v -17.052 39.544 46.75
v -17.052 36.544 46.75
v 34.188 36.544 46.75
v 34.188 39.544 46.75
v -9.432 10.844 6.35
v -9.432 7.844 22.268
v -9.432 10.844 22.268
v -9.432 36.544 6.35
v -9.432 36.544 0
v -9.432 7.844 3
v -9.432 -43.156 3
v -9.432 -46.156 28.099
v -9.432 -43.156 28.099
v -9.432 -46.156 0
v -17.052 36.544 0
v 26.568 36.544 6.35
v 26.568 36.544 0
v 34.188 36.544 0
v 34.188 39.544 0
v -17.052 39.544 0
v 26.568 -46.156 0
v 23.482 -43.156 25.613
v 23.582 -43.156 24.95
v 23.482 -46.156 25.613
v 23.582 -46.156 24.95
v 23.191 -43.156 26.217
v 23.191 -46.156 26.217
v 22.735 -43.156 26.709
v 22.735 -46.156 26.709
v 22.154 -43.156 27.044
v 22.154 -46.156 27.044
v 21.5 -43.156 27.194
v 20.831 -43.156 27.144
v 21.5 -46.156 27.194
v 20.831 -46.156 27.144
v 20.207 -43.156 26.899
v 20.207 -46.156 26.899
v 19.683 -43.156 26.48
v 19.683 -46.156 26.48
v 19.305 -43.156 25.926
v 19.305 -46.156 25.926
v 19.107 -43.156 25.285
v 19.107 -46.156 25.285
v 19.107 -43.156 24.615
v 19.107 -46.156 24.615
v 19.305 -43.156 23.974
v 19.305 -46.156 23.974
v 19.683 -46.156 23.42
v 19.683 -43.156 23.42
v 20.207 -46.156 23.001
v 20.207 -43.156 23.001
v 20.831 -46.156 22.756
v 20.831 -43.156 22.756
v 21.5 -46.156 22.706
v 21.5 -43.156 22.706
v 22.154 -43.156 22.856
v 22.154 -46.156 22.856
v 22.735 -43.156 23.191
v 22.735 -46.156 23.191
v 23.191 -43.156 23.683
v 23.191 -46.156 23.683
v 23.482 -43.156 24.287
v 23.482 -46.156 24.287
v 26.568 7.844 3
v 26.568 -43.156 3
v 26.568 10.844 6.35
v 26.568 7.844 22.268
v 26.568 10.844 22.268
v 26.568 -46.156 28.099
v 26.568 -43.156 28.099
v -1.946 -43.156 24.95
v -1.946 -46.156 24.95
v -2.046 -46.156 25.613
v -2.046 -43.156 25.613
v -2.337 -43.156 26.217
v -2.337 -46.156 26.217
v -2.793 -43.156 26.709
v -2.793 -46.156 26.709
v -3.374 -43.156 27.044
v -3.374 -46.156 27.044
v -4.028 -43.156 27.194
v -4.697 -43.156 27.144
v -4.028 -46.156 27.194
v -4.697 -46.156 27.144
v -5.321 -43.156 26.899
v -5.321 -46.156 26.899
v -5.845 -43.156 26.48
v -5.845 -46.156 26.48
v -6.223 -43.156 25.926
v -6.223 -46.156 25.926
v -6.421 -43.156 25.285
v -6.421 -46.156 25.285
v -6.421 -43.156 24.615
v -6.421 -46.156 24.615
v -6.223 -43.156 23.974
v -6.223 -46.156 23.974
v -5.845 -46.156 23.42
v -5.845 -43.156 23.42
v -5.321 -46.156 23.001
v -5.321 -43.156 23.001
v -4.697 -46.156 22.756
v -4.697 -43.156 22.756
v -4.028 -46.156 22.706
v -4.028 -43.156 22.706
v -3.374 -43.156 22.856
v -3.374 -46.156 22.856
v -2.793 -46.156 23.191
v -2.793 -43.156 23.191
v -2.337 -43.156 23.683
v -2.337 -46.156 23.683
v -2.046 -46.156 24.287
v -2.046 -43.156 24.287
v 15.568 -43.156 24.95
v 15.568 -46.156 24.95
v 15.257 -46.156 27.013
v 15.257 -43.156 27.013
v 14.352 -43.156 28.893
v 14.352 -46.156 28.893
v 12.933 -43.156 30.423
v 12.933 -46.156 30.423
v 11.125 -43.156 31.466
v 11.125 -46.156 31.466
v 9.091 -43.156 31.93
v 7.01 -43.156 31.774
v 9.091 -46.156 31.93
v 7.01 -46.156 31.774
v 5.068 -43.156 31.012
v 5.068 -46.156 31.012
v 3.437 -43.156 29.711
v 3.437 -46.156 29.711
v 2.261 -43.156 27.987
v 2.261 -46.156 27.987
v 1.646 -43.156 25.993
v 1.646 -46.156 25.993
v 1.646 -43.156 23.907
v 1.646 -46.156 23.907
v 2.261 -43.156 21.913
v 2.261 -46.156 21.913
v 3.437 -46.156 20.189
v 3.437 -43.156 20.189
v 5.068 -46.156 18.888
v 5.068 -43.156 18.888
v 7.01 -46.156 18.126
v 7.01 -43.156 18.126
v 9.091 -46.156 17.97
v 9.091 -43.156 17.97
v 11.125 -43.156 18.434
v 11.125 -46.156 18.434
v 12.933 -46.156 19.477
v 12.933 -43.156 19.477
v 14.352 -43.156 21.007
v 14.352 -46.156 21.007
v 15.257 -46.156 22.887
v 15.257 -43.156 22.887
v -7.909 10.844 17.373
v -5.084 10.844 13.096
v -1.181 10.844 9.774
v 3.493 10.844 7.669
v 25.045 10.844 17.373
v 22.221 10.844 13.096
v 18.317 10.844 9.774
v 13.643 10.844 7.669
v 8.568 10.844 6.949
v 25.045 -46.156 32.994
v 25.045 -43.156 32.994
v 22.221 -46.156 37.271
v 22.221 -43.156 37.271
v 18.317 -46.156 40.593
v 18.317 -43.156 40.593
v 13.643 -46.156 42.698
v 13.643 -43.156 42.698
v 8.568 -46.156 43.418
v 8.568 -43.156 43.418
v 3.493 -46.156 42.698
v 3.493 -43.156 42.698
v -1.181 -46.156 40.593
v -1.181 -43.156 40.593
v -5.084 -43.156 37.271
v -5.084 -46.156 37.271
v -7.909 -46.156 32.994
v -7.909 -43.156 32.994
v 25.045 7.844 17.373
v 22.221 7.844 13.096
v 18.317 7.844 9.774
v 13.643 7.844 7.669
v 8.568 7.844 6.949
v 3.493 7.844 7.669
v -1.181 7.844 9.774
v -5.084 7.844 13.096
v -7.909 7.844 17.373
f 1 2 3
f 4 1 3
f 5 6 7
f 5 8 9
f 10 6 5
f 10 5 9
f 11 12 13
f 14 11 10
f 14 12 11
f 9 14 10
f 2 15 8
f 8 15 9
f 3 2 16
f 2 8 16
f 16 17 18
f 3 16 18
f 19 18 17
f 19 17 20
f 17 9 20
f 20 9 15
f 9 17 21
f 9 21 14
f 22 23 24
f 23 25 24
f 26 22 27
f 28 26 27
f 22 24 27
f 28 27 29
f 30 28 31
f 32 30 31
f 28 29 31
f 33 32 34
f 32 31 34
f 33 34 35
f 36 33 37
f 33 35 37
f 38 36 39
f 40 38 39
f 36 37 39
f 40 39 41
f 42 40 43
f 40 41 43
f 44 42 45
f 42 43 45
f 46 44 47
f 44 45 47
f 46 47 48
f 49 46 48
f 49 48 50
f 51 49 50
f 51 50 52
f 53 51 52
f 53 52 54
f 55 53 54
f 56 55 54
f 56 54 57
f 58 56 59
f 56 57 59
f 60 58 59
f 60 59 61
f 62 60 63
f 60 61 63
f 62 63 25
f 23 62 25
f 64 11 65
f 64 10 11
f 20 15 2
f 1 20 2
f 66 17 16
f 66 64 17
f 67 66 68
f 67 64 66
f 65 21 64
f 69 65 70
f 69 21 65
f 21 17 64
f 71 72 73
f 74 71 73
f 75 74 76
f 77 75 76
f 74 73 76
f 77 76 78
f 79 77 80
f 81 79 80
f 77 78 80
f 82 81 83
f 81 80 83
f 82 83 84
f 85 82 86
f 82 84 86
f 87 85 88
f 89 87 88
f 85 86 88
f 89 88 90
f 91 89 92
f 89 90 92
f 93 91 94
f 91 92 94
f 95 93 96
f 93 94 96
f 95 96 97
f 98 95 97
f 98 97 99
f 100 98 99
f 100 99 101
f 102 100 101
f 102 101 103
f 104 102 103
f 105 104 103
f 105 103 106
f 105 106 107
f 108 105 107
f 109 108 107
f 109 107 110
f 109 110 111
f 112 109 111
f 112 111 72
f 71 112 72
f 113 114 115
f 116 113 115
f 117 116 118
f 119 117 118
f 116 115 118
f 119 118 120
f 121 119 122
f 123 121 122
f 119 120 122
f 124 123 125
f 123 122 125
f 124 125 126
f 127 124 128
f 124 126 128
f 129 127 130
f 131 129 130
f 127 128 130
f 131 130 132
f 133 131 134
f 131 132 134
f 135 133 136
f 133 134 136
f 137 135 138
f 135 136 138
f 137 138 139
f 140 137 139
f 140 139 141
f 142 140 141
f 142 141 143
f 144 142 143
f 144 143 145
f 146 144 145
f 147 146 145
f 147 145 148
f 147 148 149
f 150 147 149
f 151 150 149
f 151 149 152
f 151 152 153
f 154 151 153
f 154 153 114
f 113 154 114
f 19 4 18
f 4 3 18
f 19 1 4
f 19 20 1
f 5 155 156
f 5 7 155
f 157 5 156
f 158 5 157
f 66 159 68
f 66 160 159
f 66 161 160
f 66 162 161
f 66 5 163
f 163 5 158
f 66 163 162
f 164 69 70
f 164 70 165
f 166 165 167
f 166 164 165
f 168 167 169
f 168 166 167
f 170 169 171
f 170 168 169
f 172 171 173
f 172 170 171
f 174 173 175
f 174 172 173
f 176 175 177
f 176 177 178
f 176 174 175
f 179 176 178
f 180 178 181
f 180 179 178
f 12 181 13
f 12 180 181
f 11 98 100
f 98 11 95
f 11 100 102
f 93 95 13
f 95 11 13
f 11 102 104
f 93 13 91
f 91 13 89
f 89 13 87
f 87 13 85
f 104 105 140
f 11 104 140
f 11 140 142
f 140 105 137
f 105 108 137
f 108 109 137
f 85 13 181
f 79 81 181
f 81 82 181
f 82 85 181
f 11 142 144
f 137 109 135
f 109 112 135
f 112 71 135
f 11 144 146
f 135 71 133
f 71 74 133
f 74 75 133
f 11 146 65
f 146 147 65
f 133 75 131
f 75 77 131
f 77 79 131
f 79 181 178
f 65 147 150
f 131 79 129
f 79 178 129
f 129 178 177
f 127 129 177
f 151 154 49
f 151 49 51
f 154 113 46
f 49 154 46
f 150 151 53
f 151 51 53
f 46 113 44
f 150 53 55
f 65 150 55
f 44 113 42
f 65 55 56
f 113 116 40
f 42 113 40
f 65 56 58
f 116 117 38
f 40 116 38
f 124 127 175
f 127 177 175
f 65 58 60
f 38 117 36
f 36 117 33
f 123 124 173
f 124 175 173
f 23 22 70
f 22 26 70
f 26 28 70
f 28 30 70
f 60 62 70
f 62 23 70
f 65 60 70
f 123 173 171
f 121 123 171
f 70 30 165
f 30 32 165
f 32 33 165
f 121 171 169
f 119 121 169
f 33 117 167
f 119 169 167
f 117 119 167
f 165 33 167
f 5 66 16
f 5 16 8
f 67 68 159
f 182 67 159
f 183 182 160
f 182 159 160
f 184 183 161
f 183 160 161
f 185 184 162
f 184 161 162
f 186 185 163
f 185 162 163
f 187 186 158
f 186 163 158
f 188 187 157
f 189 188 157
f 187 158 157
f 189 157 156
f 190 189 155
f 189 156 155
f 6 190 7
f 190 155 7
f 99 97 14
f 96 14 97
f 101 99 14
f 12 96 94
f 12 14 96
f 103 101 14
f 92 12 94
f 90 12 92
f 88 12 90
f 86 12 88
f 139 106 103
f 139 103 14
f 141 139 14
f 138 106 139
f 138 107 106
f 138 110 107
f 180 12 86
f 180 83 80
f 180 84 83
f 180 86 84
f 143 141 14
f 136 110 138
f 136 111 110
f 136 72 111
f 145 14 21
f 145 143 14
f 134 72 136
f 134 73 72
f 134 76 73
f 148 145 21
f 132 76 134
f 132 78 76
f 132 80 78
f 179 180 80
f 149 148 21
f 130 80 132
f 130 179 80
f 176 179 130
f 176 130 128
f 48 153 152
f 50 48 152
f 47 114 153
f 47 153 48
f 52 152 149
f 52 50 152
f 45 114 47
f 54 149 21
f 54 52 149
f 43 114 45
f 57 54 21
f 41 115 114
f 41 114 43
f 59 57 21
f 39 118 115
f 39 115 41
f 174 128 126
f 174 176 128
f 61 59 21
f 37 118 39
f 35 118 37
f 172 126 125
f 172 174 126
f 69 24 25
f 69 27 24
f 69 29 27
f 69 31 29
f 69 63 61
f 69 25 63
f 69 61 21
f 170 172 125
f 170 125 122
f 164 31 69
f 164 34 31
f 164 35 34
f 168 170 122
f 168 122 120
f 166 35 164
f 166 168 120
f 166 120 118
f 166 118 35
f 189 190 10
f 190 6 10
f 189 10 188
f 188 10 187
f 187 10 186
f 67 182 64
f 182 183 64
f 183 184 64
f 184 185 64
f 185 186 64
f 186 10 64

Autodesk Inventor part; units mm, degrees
ref_plane "YZ Plane" through (0, 0, 0) normal (1, 0, 0) x (0, 1, 0)
ref_plane "XZ Plane" through (0, 0, 0) normal (0, 1, 0) x (-1, 0, 0)
ref_plane "XY Plane" through (0, 0, 0) normal (0, 0, 1) x (1, 0, 0)
sketch "Sketch1" plane through (0, 0, 0) normal (0, 0, 1) x (1, 0, 0)
  line L0 (-9.4319, 10.8445) -> (26.5681, 10.8445)
  line L1 (26.5681, 10.8445) -> (26.5681, -46.1555)
  line L2 (26.5681, -46.1555) -> (-9.4319, -46.1555)
  line L3 (-9.4319, -46.1555) -> (-9.4319, 10.8445)
  point P0 (0, 0)
  dimension "d0" = 36
  dimension "d1" = 57
extrude "Extrusion1" add sketch "Sketch1" along normal blind 3
sketch "Sketch2" plane through (-9.4319, 10.8445, 0) normal (0, 1, 0) x (1, 0, 0)
  line L0 (0, 0) -> (36, 0) construction
  line L1 (0, -3) -> (0, -22.268)
  line L2 (36, -3) -> (36, -22.268)
  line L3 (18, 0) -> (18, -6.949) construction
  arc A0 (36, -22.268) -> (0, -22.268) centre (18, -25.1836) ccw
  line L4 (36, -3) -> (0, -3) projected
  line L5 (36, -3) -> (0, -3)
  point P0 (9.4319, 0)
  dimension "d4" = 22.268
  dimension "d5" = 6.949
extrude "Extrusion2" add sketch "Sketch2" against normal blind 3
sketch "Sketch3" plane through (-9.4319, -46.1555, 0) normal (0, -1, 0) x (1, 0, 0)
  line L0 (0, 0) -> (0, 22.268) construction
  line L1 (36, 0) -> (36, 22.268) construction
  arc A0 (36, 28.0992) -> (0, 28.0992) centre (18, 25.1836) ccw
  line L2 (0, 22.268) -> (0, 28.0992)
  line L3 (36, 22.268) -> (36, 28.0992)
  line L4 (0, 3) -> (36, 3) projected
  arc A1 (0, 22.268) -> (36, 22.268) centre (18, 25.1836) ccw construction
  line L5 (0, 3) -> (0, 22.268)
  line L6 (36, 3) -> (36, 22.268)
  line L7 (0, 3) -> (36, 3)
  point P0 (9.4319, 0)
extrude "Extrusion3" add sketch "Sketch3" against normal blind 3
sketch "Sketch4" plane through (-9.4319, -46.1555, 0) normal (0, -1, 0) x (1, 0, 0)
  line L0 (0, 0) -> (36, 0) projected
  line L1 (18, 0) -> (18, 17.95) construction
  line L2 (18, 17.95) -> (18, 24.95) construction
  circle A0 centre (18, 24.95) radius 7
  line L3 (7.486, 24.95) -> (5.236, 24.95) construction
  circle A1 centre (5.236, 24.95) radius 2.25
  circle A2 centre (30.764, 24.95) radius 2.25
  point P0 (9.4319, 0)
  dimension "d10" = 17.95
  dimension "d11" = 7
  dimension "d13" = 2.25
extrude "Extrusion4" cut sketch "Sketch4" against normal blind 3
sketch "Sketch5" plane through (-9.4319, 10.8445, 0) normal (0, 1, 0) x (1, 0, 0)
  line L0 (36, 0) -> (0, 0) projected
  line L1 (36, 0) -> (36, -28.0992) projected
  line L2 (0, 0) -> (36, 0)
  line L3 (36, 0) -> (36, -6.35)
  line L4 (36, -6.35) -> (0, -6.35)
  line L5 (0, -6.35) -> (0, 0)
  point P0 (9.4319, 0)
  dimension "d17" = 6.35
extrude "Extrusion5" add sketch "Sketch5" along normal blind 25.7
sketch "Sketch6" plane through (-9.4319, 36.5445, 0) normal (0, 1, 0) x (1, 0, 0)
  line L0 (43.62, 0) -> (-7.62, 0)
  line L1 (-7.62, 0) -> (-7.62, -46.7504)
  line L2 (-7.62, -46.7504) -> (43.62, -46.7504)
  line L3 (43.62, -46.7504) -> (43.62, 0)
  line L4 (36, 0) -> (36, -28.0992) projected
  line L5 (0, 0) -> (0, -28.0992) projected
  dimension "d22" = 7.62
  dimension "d23" = 7.62
extrude "Extrusion6" add sketch "Sketch6" along normal blind 3
properties part number "motor connector"
